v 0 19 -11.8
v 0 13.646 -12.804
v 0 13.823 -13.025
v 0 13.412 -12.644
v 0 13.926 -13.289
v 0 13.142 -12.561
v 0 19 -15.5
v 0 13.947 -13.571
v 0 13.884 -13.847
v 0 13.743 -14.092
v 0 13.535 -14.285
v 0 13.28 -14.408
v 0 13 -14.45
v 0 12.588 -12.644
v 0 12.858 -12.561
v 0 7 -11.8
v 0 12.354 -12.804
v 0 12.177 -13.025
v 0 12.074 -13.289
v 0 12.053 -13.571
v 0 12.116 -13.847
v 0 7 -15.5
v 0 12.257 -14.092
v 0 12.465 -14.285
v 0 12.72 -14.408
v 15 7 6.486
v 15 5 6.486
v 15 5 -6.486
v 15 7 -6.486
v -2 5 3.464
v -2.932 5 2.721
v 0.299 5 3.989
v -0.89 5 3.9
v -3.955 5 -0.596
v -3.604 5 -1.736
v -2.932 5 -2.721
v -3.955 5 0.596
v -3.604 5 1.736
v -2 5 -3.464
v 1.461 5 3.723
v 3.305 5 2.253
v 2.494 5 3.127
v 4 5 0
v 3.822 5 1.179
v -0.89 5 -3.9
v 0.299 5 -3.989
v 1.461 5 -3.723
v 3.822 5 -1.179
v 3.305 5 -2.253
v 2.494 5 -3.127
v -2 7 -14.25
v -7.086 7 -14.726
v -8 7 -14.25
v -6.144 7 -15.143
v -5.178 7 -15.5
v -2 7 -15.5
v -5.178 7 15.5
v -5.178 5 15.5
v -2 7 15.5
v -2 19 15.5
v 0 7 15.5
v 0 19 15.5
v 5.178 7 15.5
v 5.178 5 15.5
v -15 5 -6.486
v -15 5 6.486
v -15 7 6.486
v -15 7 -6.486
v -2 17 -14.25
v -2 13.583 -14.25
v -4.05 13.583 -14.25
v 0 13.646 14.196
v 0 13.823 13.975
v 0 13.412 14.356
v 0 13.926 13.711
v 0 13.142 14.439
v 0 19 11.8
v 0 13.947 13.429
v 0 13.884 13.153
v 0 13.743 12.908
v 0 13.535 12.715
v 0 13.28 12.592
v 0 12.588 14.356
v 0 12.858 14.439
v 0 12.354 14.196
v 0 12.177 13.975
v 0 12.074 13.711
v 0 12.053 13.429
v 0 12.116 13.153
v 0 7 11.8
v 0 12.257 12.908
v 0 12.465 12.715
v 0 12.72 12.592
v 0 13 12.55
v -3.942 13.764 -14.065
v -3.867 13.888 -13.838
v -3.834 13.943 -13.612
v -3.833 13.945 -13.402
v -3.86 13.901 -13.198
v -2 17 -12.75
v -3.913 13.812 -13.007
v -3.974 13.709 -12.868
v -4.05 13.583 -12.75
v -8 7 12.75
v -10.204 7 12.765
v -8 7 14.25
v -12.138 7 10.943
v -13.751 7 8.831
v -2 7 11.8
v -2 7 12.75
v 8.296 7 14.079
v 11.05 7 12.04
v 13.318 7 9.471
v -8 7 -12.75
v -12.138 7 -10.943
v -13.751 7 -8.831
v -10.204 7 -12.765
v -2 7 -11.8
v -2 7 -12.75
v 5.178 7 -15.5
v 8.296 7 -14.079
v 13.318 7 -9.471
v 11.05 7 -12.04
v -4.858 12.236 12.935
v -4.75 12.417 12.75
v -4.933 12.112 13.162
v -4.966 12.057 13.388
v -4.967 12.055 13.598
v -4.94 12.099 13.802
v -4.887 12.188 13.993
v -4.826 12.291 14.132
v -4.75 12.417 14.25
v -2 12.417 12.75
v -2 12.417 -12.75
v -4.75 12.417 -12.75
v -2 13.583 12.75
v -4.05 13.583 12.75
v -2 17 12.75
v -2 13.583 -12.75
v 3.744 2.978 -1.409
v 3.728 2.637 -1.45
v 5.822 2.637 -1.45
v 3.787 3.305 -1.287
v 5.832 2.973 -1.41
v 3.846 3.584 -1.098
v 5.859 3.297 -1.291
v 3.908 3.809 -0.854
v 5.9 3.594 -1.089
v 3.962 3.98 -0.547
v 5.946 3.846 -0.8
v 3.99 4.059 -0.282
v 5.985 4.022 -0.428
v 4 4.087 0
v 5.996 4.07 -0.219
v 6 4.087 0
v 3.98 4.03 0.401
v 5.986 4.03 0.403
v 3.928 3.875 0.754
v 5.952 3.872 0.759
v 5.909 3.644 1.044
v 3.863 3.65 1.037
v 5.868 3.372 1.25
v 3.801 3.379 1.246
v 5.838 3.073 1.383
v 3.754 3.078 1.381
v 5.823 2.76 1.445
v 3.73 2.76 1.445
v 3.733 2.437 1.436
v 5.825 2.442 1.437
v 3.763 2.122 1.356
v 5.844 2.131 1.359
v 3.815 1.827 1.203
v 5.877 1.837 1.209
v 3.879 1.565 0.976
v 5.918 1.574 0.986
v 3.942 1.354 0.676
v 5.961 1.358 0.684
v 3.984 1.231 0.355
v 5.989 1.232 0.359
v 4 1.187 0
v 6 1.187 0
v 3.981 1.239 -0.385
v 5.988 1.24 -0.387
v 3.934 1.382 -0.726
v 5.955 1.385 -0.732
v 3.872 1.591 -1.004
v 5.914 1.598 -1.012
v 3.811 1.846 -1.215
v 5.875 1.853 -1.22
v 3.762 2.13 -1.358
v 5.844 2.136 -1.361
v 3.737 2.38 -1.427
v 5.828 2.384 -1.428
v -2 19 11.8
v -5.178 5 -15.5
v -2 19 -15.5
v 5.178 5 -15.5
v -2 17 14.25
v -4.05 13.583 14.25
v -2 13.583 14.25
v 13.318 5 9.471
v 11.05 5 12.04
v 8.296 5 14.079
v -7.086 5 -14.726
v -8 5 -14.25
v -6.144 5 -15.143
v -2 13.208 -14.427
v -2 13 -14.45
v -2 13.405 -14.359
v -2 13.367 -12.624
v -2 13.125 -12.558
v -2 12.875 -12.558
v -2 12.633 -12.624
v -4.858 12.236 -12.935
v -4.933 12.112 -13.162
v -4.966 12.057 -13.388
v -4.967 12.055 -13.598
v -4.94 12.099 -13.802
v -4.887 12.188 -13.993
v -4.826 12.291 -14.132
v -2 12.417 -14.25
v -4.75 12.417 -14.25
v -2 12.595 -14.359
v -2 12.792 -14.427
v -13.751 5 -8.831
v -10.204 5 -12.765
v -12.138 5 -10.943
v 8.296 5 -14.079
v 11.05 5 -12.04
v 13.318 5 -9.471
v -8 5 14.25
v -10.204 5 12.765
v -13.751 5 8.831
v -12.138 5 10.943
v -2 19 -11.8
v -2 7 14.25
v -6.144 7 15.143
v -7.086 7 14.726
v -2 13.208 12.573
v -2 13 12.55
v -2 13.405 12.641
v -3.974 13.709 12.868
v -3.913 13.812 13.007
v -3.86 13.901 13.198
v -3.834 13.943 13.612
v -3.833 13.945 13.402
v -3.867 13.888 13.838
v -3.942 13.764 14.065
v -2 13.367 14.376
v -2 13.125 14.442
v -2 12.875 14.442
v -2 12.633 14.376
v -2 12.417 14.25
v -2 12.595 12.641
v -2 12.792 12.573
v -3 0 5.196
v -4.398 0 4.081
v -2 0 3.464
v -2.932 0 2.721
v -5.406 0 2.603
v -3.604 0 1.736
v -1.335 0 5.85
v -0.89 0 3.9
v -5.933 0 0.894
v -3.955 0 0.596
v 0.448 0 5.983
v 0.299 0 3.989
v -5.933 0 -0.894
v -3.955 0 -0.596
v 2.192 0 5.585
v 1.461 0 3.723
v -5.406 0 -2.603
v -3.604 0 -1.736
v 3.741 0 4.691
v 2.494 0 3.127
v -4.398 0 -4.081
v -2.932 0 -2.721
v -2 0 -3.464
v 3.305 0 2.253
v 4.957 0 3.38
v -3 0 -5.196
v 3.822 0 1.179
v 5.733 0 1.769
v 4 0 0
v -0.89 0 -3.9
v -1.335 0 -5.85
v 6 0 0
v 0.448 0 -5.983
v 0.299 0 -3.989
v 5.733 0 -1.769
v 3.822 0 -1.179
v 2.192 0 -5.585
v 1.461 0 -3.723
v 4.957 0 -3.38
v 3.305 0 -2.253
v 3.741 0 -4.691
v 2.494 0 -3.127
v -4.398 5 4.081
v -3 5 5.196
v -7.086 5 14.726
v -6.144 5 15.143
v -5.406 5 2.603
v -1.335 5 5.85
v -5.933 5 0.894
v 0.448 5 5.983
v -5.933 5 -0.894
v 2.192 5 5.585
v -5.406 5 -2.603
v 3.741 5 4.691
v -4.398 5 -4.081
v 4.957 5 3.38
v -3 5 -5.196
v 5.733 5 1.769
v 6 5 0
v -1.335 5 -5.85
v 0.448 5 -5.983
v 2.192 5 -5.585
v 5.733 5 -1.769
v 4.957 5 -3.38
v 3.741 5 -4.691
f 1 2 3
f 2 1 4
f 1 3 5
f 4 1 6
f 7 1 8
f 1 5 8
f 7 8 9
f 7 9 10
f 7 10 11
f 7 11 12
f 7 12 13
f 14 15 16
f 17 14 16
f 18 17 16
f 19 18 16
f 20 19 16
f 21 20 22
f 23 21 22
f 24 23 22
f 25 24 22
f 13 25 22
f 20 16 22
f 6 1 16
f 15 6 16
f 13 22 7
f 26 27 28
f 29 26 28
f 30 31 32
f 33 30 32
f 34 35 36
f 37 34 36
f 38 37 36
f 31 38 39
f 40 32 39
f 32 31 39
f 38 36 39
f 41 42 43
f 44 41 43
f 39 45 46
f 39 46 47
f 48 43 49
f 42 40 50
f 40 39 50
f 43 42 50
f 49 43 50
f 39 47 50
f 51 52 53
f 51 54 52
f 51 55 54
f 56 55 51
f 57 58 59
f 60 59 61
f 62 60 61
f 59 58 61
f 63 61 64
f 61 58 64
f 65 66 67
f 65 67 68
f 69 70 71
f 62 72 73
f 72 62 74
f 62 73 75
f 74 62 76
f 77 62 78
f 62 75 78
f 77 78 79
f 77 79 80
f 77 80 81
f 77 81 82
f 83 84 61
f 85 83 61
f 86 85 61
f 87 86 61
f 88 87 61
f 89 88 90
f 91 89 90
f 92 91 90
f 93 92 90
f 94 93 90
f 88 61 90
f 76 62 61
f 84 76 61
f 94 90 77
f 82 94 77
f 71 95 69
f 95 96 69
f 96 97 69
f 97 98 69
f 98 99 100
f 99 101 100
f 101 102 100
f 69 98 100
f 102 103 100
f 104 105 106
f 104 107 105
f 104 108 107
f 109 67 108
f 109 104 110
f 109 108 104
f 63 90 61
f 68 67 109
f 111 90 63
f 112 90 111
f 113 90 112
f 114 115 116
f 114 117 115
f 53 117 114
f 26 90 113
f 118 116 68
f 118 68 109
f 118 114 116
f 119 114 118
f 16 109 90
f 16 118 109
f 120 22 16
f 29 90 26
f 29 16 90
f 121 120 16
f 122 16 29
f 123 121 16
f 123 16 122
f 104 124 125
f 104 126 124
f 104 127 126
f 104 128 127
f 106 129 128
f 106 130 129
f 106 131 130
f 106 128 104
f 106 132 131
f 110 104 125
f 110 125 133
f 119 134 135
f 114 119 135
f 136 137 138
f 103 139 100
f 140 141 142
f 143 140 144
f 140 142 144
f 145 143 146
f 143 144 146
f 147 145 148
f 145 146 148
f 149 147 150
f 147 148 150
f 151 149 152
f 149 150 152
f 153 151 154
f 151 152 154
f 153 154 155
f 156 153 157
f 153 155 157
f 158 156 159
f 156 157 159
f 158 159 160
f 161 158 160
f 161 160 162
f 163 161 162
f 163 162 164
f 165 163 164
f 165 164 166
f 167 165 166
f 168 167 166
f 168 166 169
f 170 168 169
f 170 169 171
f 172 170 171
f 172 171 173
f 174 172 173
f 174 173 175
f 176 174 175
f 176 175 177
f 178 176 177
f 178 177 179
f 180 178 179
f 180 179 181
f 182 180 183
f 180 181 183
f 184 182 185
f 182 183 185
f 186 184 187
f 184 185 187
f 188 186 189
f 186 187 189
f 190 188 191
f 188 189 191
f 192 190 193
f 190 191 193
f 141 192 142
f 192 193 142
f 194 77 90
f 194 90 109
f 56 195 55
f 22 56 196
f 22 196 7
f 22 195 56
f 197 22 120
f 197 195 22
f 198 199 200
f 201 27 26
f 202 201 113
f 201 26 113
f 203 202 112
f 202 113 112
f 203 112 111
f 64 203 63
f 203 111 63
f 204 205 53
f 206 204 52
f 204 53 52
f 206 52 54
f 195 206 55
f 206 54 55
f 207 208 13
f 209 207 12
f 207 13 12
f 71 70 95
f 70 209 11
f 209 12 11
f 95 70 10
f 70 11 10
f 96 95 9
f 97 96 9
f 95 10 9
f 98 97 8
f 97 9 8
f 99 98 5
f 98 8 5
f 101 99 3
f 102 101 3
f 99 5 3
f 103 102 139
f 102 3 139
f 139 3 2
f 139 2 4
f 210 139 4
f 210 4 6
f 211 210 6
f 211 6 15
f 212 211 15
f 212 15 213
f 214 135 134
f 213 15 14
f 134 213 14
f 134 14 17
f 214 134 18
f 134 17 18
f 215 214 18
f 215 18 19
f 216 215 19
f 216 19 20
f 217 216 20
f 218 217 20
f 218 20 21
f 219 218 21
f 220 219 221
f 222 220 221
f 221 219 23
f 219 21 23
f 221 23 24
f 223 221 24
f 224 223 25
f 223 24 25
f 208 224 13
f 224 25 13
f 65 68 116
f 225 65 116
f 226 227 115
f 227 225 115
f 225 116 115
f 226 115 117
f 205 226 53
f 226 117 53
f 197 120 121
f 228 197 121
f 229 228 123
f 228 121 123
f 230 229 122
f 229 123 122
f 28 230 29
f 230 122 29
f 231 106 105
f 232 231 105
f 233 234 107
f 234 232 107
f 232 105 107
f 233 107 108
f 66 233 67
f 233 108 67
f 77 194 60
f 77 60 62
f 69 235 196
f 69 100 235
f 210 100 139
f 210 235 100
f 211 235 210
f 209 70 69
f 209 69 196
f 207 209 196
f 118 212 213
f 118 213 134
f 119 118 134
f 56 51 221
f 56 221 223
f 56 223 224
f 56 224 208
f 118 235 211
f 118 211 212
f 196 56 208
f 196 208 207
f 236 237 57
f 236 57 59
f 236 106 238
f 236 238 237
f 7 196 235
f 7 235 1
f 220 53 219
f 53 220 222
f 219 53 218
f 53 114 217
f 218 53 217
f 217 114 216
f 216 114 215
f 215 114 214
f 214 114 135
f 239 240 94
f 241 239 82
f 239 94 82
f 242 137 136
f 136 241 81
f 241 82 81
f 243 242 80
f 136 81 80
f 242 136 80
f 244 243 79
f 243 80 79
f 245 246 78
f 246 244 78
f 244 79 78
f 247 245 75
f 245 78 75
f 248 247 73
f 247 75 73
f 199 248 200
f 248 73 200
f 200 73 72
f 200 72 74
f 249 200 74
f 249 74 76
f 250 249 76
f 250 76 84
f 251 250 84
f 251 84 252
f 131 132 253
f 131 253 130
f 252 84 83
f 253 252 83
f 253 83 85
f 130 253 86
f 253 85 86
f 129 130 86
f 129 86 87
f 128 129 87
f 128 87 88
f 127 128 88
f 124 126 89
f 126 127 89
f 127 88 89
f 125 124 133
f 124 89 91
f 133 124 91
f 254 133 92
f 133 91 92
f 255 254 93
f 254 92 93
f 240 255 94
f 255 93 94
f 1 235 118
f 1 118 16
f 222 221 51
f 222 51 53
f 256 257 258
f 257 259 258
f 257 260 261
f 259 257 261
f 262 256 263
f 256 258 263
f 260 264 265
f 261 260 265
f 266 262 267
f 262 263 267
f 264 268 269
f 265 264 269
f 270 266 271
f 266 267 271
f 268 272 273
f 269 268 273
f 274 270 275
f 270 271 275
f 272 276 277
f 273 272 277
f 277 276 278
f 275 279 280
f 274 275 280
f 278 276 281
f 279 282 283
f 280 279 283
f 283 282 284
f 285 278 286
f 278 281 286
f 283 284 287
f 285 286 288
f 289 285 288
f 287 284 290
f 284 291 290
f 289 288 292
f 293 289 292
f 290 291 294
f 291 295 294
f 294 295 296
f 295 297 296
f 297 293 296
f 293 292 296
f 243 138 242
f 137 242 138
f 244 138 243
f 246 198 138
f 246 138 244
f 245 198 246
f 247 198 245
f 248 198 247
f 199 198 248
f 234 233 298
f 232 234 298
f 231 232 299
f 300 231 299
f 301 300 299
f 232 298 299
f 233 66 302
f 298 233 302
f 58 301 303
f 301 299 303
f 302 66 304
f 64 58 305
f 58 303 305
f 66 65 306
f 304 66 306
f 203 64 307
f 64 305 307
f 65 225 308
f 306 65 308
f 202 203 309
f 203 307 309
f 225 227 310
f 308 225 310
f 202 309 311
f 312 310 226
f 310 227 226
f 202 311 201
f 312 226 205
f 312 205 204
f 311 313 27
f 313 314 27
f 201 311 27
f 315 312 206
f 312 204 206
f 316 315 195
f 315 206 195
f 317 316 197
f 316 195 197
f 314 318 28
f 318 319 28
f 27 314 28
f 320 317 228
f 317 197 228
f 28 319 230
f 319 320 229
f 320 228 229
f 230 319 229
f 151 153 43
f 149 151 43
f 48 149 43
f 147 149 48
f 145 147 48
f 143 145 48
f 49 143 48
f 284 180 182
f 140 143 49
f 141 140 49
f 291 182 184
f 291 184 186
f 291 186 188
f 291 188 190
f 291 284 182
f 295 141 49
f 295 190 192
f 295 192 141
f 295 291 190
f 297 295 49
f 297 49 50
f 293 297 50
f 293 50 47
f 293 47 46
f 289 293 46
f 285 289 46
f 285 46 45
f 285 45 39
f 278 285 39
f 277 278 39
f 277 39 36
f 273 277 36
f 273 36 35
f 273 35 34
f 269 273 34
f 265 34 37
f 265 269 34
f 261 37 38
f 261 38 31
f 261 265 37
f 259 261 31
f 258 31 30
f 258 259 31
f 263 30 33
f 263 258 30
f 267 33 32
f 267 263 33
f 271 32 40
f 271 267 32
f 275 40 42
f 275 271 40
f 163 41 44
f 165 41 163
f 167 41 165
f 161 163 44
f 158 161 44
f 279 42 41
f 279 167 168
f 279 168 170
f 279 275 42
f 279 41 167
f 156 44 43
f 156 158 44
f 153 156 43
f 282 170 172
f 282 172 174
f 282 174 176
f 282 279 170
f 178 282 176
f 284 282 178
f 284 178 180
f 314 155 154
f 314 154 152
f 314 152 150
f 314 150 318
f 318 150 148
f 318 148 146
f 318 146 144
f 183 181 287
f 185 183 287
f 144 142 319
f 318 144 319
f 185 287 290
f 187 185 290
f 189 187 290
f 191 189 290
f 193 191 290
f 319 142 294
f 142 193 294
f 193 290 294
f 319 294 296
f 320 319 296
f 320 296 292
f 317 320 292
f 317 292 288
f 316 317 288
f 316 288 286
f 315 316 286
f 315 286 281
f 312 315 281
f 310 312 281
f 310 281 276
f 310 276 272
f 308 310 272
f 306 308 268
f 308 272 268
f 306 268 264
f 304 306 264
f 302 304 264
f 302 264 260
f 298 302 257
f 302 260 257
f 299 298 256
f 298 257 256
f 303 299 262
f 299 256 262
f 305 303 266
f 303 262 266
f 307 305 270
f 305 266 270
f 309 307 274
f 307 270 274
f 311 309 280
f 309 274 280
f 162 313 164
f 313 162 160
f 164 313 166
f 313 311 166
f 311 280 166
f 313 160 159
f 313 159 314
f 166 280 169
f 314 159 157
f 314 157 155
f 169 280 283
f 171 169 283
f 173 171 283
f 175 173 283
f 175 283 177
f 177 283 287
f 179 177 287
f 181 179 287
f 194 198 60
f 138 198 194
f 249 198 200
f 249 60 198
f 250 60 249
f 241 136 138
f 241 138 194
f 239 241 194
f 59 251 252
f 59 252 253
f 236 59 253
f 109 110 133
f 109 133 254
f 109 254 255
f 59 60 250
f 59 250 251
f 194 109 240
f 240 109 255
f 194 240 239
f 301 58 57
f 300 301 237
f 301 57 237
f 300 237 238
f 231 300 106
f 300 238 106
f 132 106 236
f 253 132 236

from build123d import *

# Parameters (mm, degrees)
SKETCH_1_R               = 6
SKETCH_1_R_2             = 4
EXTRUDE_1_DEPTH          = 5
CUT_EXTRUDE_1_REACH      = 16.318
CUT_EXTRUDE_1_END_RADIUS = 4
SKETCH_2_R               = 1.45
SKETCH_3_W               = 30
SKETCH_3_H               = 31
SKETCH_3_R               = 6
EXTRUDE_1_2_DEPTH        = 2
SKETCH_6_W               = 2
SKETCH_6_H               = 4
EXTRUDE_2_DEPTH          = 12
EXTRUDE_3_DEPTH          = 1.5
EXTRUDE_START            = -1.25
EXTRUDE_4_DEPTH          = 1.5
CUT_EXTRUDE_3_REACH      = 30.745
SKETCH_11_R              = 0.95
CUT_EXTRUDE_4_REACH      = 30.745
SKETCH_12_R              = 0.95
CUT_EXTRUDE_5_REACH      = 26.683
SKETCH_14_W              = 2
SKETCH_14_H              = 12
CUT_EXTRUDE_6_DEPTH      = 0.3
SKETCH_15_W              = 2
SKETCH_15_H              = 12
CUT_EXTRUDE_7_DEPTH      = 0.3


with BuildPart() as part:
    # 草图1 → Extrude 1 (new body)
    with BuildSketch(Plane(origin=(0, 0, 0), x_dir=(1, 0, 0), z_dir=(0, 1, 0))):
        Circle(SKETCH_1_R)
        Circle(SKETCH_1_R_2, mode=Mode.SUBTRACT)
    extrude(amount=EXTRUDE_1_DEPTH)

    # 切除-拉伸1: up to this cylinder (the profile starts outside it)
    cut_extrude_1_end = Plane(origin=(0, 2.637062, 0), z_dir=(0, -1, 0)) * Cylinder(CUT_EXTRUDE_1_END_RADIUS, 41.636, mode=Mode.PRIVATE)
    # 草图2 → 切除-拉伸1 (cut, up to the surface)
    with BuildSketch(Plane(origin=(6, 0, 0), x_dir=(0, 0, -1), z_dir=(1, 0, 0)), mode=Mode.PRIVATE) as cut_extrude_1_sk1:
        with Locations((0, 2.637062232)):
            Circle(SKETCH_2_R)
    cut_extrude_1_tool1 = extrude(cut_extrude_1_sk1.sketch, amount=-CUT_EXTRUDE_1_REACH, mode=Mode.PRIVATE) - cut_extrude_1_end
    add(cut_extrude_1_tool1.solids().sort_by_distance((6, 2.637062, 0))[0], mode=Mode.SUBTRACT)

    # 草图3 → Extrude 1 2 (add)
    # profile 1 of 2: a face of its own
    with BuildSketch(Plane(origin=(0, 5, 0), x_dir=(1, 0, 0), z_dir=(0, 1, 0))):
        Rectangle(SKETCH_3_W, SKETCH_3_H)
        Circle(SKETCH_3_R, mode=Mode.SUBTRACT)
    # profile 2 of 2: a face of its own
    with BuildSketch(Plane(origin=(0, 5, 0), x_dir=(1, 0, 0), z_dir=(0, 1, 0))):
        Circle(SKETCH_3_R)
    extrude(amount=EXTRUDE_1_2_DEPTH)

    # 草图6 → 凸台-拉伸2 (add)
    with BuildSketch(Plane(origin=(0, 7, 0), x_dir=(1, 0, 0), z_dir=(0, 1, 0))):
        with Locations((-1, 13.5)):
            Rectangle(SKETCH_6_W, SKETCH_6_H)
        with Locations((-1, -13.5)):
            Rectangle(SKETCH_6_W, SKETCH_6_H)
    extrude(amount=EXTRUDE_2_DEPTH)

    # 草图9 → 凸台-拉伸3 (add)
    with BuildSketch(Plane.XY.offset(-12.75)):
        Polygon((-2, 7), (-8, 7), (-2, 17), align=None)
    extrude(amount=-EXTRUDE_3_DEPTH)

    # 草图10 → 凸台-拉伸4 (add)
    with BuildSketch(Plane.XY.offset(15.5).offset(EXTRUDE_START)):
        Polygon((-2, 7), (-2, 17), (-8, 7), align=None)
    extrude(amount=-EXTRUDE_4_DEPTH)

    # 草图11 → 切除-拉伸3 (cut, up to next)
    with BuildSketch(Plane(origin=(0, 0, 0), x_dir=(0, 0, -1), z_dir=(1, 0, 0)), mode=Mode.PRIVATE) as cut_extrude_3_sk1:
        with Locations((-13.5, 13)):
            Circle(SKETCH_11_R)
    cut_extrude_3_tool1 = extrude(cut_extrude_3_sk1.sketch, amount=-CUT_EXTRUDE_3_REACH, mode=Mode.PRIVATE) & part.part
    add(cut_extrude_3_tool1.solids().sort_by_distance((0, 13, 13.5))[0], mode=Mode.SUBTRACT)

    # 草图12 → 切除-拉伸4 (cut, up to next)
    with BuildSketch(Plane(origin=(0, 0, 0), x_dir=(0, 0, -1), z_dir=(1, 0, 0)), mode=Mode.PRIVATE) as cut_extrude_4_sk1:
        with Locations((13.5, 13)):
            Circle(SKETCH_12_R)
    cut_extrude_4_tool1 = extrude(cut_extrude_4_sk1.sketch, amount=-CUT_EXTRUDE_4_REACH, mode=Mode.PRIVATE) & part.part
    add(cut_extrude_4_tool1.solids().sort_by_distance((0, 13, -13.5))[0], mode=Mode.SUBTRACT)

    # 草图13 → 切除-拉伸5 (cut, up to next)
    with BuildSketch(Plane(origin=(0, 7, 0), x_dir=(1, 0, 0), z_dir=(0, 1, 0)), mode=Mode.PRIVATE) as cut_extrude_5_sk1:
        with BuildLine():
            ThreePointArc((-5.178078794, -15.5), (-6.61861505, -14.941768129), (-8, -14.25))
            ThreePointArc((-8, -14.25), (-12.137612149, -10.942617206), (-15, -6.485560886))
            Line((-15, -6.485560886), (-15, -15.5))
            Line((-15, -15.5), (-5.178078794, -15.5))
        make_face()
    cut_extrude_5_tool1 = extrude(cut_extrude_5_sk1.sketch, amount=-CUT_EXTRUDE_5_REACH, mode=Mode.PRIVATE) & part.part
    # 草图13 → 切除-拉伸5 (cut, up to next)
    with BuildSketch(Plane(origin=(0, 7, 0), x_dir=(1, 0, 0), z_dir=(0, 1, 0)), mode=Mode.PRIVATE) as cut_extrude_5_sk2:
        with BuildLine():
            ThreePointArc((15, -6.485560886), (11.050056294, -12.039881889), (5.178078794, -15.5))
            Line((5.178078794, -15.5), (15, -15.5))
            Line((15, -15.5), (15, -6.485560886))
        make_face()
    cut_extrude_5_tool2 = extrude(cut_extrude_5_sk2.sketch, amount=-CUT_EXTRUDE_5_REACH, mode=Mode.PRIVATE) & part.part
    # 草图13 → 切除-拉伸5 (cut, up to next)
    with BuildSketch(Plane(origin=(0, 7, 0), x_dir=(1, 0, 0), z_dir=(0, 1, 0)), mode=Mode.PRIVATE) as cut_extrude_5_sk3:
        with BuildLine():
            ThreePointArc((5.178078794, 15.5), (11.050056294, 12.039881889), (15, 6.485560886))
            Line((15, 6.485560886), (15, 15.5))
            Line((15, 15.5), (5.178078794, 15.5))
        make_face()
    cut_extrude_5_tool3 = extrude(cut_extrude_5_sk3.sketch, amount=-CUT_EXTRUDE_5_REACH, mode=Mode.PRIVATE) & part.part
    # 草图13 → 切除-拉伸5 (cut, up to next)
    with BuildSketch(Plane(origin=(0, 7, 0), x_dir=(1, 0, 0), z_dir=(0, 1, 0)), mode=Mode.PRIVATE) as cut_extrude_5_sk4:
        with BuildLine():
            Line((-15, 15.5), (-15, 6.485560886))
            ThreePointArc((-15, 6.485560886), (-12.137612149, 10.942617206), (-8, 14.25))
            ThreePointArc((-8, 14.25), (-6.61861505, 14.941768129), (-5.178078794, 15.5))
            Line((-5.178078794, 15.5), (-15, 15.5))
        make_face()
    cut_extrude_5_tool4 = extrude(cut_extrude_5_sk4.sketch, amount=-CUT_EXTRUDE_5_REACH, mode=Mode.PRIVATE) & part.part
    add(cut_extrude_5_tool1.solids().sort_by_distance((-12.231882, 7, 12.932652))[0], mode=Mode.SUBTRACT)
    add(cut_extrude_5_tool2.solids().sort_by_distance((12.231882, 7, 12.932652))[0], mode=Mode.SUBTRACT)
    add(cut_extrude_5_tool3.solids().sort_by_distance((12.231882, 7, -12.932652))[0], mode=Mode.SUBTRACT)
    add(cut_extrude_5_tool4.solids().sort_by_distance((-12.231882, 7, -12.932652))[0], mode=Mode.SUBTRACT)

    # 草图14 → 切除-拉伸6 (cut)
    with BuildSketch(Plane(origin=(0, 0, 11.5), x_dir=(-1, 0, 0), z_dir=(0, 0, -1))):
        with Locations((1, 13)):
            Rectangle(SKETCH_14_W, SKETCH_14_H)
    extrude(amount=-CUT_EXTRUDE_6_DEPTH, mode=Mode.SUBTRACT)

    # 草图15 → 切除-拉伸7 (cut)
    with BuildSketch(Plane.XY.offset(-11.5)):
        with Locations((-1, 13)):
            Rectangle(SKETCH_15_W, SKETCH_15_H)
    extrude(amount=-CUT_EXTRUDE_7_DEPTH, mode=Mode.SUBTRACT)


solid = part.part
